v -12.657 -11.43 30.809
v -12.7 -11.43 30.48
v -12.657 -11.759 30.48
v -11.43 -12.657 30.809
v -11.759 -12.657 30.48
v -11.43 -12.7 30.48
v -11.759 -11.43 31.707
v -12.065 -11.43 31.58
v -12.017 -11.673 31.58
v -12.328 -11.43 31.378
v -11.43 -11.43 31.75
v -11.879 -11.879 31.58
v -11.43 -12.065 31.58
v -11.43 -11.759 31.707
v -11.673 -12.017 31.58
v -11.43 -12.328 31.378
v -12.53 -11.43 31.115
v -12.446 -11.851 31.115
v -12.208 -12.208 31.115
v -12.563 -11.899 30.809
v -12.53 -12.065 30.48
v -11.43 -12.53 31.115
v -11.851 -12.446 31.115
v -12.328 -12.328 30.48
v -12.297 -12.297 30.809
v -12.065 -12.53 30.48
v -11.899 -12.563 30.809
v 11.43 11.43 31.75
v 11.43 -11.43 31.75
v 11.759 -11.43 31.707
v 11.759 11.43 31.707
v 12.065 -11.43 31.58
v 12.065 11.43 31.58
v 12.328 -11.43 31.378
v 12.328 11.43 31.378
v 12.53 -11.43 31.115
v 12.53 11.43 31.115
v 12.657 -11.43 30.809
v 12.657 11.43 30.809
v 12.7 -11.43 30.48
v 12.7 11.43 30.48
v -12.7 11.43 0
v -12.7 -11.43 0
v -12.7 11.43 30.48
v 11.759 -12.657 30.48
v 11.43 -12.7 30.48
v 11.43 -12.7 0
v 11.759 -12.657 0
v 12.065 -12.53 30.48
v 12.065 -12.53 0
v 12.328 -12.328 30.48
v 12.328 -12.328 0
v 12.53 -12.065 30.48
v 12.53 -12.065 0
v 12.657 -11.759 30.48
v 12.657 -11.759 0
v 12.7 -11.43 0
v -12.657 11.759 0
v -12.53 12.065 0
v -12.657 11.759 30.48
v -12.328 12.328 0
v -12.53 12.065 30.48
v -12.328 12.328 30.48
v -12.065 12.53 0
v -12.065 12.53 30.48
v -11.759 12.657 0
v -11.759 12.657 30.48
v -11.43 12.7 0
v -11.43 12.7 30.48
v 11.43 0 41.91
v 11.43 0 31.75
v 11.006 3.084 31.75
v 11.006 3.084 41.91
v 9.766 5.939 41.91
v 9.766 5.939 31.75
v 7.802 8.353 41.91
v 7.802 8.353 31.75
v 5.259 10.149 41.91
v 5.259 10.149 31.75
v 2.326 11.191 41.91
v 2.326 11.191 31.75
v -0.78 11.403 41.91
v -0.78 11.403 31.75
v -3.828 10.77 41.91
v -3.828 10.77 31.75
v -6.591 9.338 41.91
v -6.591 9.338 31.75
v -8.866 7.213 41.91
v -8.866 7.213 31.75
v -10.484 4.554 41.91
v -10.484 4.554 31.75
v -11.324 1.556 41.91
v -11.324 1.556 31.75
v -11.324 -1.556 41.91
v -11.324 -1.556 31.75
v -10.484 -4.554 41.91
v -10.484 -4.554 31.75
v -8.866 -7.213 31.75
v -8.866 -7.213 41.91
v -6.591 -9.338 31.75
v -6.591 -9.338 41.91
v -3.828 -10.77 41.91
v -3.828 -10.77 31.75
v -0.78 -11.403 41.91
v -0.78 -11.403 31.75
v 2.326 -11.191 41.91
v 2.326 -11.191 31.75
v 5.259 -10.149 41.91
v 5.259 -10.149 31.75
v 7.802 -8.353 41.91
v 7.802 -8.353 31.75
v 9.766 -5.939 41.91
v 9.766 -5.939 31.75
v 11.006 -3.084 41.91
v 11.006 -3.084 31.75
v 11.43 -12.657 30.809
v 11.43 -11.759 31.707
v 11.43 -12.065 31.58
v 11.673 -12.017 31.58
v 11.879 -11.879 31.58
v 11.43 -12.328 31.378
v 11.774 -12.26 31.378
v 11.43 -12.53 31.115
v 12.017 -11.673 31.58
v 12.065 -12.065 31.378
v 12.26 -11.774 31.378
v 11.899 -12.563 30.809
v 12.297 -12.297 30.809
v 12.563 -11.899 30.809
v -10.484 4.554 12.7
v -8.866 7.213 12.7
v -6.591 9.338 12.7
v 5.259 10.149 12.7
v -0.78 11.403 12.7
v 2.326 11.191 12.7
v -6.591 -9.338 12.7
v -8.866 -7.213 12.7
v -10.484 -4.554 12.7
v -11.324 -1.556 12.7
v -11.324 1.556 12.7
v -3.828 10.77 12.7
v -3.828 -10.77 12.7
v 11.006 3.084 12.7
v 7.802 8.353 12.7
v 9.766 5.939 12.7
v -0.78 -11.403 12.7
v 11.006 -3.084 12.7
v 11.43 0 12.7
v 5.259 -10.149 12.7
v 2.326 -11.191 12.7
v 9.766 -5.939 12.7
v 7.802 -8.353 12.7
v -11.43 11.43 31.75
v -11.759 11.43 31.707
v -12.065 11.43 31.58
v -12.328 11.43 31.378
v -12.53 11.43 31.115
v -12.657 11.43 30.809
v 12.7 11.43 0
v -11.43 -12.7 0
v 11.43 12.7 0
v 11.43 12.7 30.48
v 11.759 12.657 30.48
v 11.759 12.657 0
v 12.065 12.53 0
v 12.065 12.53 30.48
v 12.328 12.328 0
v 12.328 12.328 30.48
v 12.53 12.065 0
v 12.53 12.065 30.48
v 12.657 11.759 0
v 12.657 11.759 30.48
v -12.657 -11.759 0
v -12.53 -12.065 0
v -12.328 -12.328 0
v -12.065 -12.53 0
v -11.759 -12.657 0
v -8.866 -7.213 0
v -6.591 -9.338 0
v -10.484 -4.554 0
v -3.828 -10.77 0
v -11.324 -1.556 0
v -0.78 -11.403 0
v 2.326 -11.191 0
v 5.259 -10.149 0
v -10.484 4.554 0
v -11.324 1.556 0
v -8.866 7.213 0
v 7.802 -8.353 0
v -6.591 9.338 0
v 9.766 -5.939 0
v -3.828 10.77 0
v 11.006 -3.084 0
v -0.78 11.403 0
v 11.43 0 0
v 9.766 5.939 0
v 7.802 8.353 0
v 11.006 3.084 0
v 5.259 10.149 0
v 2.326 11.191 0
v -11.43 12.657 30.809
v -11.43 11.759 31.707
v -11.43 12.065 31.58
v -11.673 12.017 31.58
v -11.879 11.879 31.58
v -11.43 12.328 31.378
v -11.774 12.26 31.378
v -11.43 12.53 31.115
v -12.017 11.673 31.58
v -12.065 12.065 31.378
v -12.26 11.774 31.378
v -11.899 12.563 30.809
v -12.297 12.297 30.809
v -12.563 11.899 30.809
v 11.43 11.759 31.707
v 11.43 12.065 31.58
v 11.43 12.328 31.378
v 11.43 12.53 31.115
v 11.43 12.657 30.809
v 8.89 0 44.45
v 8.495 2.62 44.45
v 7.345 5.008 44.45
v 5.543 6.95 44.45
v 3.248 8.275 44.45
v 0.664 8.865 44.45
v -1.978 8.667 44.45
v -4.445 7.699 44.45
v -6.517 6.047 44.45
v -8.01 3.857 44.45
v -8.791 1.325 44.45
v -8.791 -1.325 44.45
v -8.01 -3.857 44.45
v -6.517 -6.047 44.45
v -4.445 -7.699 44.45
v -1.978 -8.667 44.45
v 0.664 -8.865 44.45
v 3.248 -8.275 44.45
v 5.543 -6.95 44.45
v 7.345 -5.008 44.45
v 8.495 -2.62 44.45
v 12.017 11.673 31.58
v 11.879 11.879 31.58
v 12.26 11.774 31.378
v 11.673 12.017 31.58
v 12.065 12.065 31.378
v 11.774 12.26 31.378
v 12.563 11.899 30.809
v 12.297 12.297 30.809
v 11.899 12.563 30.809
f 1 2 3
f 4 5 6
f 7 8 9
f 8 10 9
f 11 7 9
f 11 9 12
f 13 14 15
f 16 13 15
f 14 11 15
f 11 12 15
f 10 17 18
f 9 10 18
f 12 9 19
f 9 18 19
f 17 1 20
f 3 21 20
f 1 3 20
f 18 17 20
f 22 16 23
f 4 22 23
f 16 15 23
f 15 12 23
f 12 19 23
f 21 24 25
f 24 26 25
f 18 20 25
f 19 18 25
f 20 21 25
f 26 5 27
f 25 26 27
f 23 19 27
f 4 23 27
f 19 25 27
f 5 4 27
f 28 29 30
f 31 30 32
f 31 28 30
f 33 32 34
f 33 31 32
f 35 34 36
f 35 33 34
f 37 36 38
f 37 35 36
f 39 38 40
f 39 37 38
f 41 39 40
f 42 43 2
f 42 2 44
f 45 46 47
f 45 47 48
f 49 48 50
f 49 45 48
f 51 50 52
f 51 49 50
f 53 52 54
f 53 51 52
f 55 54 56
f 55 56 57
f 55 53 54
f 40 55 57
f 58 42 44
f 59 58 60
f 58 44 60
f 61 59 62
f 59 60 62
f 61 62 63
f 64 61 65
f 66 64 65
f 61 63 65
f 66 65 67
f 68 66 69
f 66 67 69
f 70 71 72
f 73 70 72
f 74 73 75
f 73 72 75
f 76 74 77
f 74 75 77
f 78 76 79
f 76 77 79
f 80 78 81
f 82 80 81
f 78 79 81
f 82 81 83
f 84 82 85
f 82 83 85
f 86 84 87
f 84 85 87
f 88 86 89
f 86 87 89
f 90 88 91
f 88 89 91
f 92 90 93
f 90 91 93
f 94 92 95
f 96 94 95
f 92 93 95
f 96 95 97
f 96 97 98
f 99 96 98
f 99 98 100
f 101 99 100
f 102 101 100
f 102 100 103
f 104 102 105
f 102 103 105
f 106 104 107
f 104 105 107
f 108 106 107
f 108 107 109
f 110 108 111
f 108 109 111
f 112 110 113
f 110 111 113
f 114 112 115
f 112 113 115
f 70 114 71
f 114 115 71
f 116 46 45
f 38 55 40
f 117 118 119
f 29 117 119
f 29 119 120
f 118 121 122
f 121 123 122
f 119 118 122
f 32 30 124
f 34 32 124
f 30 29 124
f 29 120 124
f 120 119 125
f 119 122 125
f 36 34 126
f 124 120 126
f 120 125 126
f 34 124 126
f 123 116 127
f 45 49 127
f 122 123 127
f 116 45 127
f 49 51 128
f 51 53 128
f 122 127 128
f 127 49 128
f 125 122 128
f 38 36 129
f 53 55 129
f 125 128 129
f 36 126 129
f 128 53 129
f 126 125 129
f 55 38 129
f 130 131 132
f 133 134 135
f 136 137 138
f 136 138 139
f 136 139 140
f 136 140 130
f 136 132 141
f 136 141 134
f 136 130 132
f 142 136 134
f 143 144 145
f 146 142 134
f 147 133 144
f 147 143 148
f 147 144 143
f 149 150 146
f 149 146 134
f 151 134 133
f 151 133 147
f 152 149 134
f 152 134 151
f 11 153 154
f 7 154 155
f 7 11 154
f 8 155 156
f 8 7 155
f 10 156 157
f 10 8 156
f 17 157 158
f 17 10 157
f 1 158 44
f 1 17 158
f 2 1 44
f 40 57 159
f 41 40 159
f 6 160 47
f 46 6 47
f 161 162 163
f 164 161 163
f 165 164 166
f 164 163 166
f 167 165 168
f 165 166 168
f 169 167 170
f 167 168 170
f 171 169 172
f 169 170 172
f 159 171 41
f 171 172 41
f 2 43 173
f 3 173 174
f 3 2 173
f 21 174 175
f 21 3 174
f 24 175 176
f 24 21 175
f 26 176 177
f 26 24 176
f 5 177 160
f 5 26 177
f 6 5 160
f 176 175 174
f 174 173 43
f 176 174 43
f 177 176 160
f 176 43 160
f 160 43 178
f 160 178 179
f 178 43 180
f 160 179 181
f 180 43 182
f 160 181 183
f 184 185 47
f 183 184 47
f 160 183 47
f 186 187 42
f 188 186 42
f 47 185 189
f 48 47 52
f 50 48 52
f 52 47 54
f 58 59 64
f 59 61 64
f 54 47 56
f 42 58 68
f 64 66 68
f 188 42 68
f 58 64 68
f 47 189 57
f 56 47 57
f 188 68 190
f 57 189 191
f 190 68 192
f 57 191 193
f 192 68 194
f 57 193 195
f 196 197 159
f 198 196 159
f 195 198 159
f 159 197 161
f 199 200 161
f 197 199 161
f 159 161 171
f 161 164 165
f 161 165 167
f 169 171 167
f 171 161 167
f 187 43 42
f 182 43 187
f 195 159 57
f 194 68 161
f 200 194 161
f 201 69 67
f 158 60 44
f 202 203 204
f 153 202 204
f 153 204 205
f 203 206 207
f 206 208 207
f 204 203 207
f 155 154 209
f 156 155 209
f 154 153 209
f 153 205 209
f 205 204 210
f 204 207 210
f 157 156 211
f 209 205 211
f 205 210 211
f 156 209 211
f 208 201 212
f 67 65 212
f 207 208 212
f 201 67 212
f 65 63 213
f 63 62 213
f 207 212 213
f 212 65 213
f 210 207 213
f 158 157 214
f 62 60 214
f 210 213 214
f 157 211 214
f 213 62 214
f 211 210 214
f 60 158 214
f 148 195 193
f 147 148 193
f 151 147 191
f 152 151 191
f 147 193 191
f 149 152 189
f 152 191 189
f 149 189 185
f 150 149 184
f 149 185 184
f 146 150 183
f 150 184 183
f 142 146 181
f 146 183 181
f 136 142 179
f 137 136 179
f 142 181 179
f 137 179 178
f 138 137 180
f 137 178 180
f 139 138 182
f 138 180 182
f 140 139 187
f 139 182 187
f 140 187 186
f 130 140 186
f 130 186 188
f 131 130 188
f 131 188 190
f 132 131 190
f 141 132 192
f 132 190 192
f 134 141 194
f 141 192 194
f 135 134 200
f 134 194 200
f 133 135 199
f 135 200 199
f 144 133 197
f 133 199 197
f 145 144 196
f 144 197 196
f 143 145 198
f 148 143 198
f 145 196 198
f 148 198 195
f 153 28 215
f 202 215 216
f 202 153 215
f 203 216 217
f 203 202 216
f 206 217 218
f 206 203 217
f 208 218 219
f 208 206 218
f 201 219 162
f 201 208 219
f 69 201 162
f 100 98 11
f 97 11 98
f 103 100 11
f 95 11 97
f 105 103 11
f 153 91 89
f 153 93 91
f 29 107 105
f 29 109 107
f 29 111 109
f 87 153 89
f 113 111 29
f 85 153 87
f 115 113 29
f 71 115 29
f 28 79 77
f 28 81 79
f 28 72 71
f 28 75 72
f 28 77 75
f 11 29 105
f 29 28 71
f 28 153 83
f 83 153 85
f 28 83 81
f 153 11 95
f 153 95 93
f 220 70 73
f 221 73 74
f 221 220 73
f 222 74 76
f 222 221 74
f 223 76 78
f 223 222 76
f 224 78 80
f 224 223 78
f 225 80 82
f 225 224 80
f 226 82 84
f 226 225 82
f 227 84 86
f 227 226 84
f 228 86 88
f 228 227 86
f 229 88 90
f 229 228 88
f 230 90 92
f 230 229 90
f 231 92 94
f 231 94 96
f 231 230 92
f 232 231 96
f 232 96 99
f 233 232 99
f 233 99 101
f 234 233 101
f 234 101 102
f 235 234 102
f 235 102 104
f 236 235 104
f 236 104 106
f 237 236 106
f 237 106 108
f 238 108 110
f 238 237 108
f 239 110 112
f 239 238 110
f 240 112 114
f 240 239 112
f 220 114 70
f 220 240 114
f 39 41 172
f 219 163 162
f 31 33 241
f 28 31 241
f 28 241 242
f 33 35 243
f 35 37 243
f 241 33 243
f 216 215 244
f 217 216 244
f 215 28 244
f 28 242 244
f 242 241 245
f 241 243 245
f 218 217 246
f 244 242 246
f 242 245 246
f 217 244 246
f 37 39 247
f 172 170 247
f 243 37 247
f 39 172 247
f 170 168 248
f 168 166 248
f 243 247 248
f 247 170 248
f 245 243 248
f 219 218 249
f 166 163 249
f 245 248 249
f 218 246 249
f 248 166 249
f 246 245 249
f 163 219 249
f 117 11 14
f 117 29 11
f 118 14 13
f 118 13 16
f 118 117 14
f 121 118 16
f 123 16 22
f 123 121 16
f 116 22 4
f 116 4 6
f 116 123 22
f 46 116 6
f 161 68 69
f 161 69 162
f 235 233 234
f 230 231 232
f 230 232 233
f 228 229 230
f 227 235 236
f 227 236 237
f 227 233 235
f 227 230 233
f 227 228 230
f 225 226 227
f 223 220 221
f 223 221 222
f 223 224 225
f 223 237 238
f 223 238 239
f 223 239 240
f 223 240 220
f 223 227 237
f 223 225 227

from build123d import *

# Parameters (mm, degrees)
F0_W     = 25.4
F0_H     = 25.4
F1_DEPTH = 31.75
F2_R     = 11.43
F3_DEPTH = 12.7
F4_SIZE  = 2.54
F5_R     = 1.27
F6_R     = 1.26999
F7_R     = 11.43
F8_DEPTH = 12.7


# Not quite as in the source:
# - a fillet or chamfer is up to 0.001 mm smaller than in the source, because OpenCascade refuses the exact size


with BuildPart() as f1:
    # F0 (on Top) → F1 (new body)
    with BuildSketch(Plane.XY):
        Rectangle(F0_W, F0_H)
    extrude(amount=F1_DEPTH)

    # F2 (on face) → F3 (join)
    with BuildSketch(Plane.XY.offset(31.75)):
        Circle(F2_R)
    extrude(amount=F3_DEPTH)

    # F4
    f4_edges = [f1.edges().sort_by_distance(p)[0] for p in [
        (-11.43, 0, 44.45),
    ]]
    chamfer(f4_edges, length=F4_SIZE)

    # F5
    f5_edges = [f1.edges().sort_by_distance(p)[0] for p in [
        (-12.7, -12.7, 15.875),
        (12.7, -12.7, 15.875),
        (-12.7, 12.7, 15.875),
        (12.7, 12.7, 15.875),
    ]]
    fillet(f5_edges, radius=F5_R)

    # F6 (radius 1.27 in the source; OpenCascade refuses exactly that, so slightly less here)
    f6_edges = [f1.edges().sort_by_distance(p)[0] for p in [
        (0, -12.7, 31.75),
        (12.7, 0, 31.75),
        (0, 12.7, 31.75),
        (-12.7, 0, 31.75),
    ]]
    fillet(f6_edges, radius=F6_R)

    # F7 (on face) → F8 (cut)
    with BuildSketch(Plane(origin=(0, 0, 0), x_dir=(1, 0, 0), z_dir=(0, 0, -1))):
        Circle(F7_R)
    extrude(amount=-F8_DEPTH, mode=Mode.SUBTRACT)


solid = f1.part
